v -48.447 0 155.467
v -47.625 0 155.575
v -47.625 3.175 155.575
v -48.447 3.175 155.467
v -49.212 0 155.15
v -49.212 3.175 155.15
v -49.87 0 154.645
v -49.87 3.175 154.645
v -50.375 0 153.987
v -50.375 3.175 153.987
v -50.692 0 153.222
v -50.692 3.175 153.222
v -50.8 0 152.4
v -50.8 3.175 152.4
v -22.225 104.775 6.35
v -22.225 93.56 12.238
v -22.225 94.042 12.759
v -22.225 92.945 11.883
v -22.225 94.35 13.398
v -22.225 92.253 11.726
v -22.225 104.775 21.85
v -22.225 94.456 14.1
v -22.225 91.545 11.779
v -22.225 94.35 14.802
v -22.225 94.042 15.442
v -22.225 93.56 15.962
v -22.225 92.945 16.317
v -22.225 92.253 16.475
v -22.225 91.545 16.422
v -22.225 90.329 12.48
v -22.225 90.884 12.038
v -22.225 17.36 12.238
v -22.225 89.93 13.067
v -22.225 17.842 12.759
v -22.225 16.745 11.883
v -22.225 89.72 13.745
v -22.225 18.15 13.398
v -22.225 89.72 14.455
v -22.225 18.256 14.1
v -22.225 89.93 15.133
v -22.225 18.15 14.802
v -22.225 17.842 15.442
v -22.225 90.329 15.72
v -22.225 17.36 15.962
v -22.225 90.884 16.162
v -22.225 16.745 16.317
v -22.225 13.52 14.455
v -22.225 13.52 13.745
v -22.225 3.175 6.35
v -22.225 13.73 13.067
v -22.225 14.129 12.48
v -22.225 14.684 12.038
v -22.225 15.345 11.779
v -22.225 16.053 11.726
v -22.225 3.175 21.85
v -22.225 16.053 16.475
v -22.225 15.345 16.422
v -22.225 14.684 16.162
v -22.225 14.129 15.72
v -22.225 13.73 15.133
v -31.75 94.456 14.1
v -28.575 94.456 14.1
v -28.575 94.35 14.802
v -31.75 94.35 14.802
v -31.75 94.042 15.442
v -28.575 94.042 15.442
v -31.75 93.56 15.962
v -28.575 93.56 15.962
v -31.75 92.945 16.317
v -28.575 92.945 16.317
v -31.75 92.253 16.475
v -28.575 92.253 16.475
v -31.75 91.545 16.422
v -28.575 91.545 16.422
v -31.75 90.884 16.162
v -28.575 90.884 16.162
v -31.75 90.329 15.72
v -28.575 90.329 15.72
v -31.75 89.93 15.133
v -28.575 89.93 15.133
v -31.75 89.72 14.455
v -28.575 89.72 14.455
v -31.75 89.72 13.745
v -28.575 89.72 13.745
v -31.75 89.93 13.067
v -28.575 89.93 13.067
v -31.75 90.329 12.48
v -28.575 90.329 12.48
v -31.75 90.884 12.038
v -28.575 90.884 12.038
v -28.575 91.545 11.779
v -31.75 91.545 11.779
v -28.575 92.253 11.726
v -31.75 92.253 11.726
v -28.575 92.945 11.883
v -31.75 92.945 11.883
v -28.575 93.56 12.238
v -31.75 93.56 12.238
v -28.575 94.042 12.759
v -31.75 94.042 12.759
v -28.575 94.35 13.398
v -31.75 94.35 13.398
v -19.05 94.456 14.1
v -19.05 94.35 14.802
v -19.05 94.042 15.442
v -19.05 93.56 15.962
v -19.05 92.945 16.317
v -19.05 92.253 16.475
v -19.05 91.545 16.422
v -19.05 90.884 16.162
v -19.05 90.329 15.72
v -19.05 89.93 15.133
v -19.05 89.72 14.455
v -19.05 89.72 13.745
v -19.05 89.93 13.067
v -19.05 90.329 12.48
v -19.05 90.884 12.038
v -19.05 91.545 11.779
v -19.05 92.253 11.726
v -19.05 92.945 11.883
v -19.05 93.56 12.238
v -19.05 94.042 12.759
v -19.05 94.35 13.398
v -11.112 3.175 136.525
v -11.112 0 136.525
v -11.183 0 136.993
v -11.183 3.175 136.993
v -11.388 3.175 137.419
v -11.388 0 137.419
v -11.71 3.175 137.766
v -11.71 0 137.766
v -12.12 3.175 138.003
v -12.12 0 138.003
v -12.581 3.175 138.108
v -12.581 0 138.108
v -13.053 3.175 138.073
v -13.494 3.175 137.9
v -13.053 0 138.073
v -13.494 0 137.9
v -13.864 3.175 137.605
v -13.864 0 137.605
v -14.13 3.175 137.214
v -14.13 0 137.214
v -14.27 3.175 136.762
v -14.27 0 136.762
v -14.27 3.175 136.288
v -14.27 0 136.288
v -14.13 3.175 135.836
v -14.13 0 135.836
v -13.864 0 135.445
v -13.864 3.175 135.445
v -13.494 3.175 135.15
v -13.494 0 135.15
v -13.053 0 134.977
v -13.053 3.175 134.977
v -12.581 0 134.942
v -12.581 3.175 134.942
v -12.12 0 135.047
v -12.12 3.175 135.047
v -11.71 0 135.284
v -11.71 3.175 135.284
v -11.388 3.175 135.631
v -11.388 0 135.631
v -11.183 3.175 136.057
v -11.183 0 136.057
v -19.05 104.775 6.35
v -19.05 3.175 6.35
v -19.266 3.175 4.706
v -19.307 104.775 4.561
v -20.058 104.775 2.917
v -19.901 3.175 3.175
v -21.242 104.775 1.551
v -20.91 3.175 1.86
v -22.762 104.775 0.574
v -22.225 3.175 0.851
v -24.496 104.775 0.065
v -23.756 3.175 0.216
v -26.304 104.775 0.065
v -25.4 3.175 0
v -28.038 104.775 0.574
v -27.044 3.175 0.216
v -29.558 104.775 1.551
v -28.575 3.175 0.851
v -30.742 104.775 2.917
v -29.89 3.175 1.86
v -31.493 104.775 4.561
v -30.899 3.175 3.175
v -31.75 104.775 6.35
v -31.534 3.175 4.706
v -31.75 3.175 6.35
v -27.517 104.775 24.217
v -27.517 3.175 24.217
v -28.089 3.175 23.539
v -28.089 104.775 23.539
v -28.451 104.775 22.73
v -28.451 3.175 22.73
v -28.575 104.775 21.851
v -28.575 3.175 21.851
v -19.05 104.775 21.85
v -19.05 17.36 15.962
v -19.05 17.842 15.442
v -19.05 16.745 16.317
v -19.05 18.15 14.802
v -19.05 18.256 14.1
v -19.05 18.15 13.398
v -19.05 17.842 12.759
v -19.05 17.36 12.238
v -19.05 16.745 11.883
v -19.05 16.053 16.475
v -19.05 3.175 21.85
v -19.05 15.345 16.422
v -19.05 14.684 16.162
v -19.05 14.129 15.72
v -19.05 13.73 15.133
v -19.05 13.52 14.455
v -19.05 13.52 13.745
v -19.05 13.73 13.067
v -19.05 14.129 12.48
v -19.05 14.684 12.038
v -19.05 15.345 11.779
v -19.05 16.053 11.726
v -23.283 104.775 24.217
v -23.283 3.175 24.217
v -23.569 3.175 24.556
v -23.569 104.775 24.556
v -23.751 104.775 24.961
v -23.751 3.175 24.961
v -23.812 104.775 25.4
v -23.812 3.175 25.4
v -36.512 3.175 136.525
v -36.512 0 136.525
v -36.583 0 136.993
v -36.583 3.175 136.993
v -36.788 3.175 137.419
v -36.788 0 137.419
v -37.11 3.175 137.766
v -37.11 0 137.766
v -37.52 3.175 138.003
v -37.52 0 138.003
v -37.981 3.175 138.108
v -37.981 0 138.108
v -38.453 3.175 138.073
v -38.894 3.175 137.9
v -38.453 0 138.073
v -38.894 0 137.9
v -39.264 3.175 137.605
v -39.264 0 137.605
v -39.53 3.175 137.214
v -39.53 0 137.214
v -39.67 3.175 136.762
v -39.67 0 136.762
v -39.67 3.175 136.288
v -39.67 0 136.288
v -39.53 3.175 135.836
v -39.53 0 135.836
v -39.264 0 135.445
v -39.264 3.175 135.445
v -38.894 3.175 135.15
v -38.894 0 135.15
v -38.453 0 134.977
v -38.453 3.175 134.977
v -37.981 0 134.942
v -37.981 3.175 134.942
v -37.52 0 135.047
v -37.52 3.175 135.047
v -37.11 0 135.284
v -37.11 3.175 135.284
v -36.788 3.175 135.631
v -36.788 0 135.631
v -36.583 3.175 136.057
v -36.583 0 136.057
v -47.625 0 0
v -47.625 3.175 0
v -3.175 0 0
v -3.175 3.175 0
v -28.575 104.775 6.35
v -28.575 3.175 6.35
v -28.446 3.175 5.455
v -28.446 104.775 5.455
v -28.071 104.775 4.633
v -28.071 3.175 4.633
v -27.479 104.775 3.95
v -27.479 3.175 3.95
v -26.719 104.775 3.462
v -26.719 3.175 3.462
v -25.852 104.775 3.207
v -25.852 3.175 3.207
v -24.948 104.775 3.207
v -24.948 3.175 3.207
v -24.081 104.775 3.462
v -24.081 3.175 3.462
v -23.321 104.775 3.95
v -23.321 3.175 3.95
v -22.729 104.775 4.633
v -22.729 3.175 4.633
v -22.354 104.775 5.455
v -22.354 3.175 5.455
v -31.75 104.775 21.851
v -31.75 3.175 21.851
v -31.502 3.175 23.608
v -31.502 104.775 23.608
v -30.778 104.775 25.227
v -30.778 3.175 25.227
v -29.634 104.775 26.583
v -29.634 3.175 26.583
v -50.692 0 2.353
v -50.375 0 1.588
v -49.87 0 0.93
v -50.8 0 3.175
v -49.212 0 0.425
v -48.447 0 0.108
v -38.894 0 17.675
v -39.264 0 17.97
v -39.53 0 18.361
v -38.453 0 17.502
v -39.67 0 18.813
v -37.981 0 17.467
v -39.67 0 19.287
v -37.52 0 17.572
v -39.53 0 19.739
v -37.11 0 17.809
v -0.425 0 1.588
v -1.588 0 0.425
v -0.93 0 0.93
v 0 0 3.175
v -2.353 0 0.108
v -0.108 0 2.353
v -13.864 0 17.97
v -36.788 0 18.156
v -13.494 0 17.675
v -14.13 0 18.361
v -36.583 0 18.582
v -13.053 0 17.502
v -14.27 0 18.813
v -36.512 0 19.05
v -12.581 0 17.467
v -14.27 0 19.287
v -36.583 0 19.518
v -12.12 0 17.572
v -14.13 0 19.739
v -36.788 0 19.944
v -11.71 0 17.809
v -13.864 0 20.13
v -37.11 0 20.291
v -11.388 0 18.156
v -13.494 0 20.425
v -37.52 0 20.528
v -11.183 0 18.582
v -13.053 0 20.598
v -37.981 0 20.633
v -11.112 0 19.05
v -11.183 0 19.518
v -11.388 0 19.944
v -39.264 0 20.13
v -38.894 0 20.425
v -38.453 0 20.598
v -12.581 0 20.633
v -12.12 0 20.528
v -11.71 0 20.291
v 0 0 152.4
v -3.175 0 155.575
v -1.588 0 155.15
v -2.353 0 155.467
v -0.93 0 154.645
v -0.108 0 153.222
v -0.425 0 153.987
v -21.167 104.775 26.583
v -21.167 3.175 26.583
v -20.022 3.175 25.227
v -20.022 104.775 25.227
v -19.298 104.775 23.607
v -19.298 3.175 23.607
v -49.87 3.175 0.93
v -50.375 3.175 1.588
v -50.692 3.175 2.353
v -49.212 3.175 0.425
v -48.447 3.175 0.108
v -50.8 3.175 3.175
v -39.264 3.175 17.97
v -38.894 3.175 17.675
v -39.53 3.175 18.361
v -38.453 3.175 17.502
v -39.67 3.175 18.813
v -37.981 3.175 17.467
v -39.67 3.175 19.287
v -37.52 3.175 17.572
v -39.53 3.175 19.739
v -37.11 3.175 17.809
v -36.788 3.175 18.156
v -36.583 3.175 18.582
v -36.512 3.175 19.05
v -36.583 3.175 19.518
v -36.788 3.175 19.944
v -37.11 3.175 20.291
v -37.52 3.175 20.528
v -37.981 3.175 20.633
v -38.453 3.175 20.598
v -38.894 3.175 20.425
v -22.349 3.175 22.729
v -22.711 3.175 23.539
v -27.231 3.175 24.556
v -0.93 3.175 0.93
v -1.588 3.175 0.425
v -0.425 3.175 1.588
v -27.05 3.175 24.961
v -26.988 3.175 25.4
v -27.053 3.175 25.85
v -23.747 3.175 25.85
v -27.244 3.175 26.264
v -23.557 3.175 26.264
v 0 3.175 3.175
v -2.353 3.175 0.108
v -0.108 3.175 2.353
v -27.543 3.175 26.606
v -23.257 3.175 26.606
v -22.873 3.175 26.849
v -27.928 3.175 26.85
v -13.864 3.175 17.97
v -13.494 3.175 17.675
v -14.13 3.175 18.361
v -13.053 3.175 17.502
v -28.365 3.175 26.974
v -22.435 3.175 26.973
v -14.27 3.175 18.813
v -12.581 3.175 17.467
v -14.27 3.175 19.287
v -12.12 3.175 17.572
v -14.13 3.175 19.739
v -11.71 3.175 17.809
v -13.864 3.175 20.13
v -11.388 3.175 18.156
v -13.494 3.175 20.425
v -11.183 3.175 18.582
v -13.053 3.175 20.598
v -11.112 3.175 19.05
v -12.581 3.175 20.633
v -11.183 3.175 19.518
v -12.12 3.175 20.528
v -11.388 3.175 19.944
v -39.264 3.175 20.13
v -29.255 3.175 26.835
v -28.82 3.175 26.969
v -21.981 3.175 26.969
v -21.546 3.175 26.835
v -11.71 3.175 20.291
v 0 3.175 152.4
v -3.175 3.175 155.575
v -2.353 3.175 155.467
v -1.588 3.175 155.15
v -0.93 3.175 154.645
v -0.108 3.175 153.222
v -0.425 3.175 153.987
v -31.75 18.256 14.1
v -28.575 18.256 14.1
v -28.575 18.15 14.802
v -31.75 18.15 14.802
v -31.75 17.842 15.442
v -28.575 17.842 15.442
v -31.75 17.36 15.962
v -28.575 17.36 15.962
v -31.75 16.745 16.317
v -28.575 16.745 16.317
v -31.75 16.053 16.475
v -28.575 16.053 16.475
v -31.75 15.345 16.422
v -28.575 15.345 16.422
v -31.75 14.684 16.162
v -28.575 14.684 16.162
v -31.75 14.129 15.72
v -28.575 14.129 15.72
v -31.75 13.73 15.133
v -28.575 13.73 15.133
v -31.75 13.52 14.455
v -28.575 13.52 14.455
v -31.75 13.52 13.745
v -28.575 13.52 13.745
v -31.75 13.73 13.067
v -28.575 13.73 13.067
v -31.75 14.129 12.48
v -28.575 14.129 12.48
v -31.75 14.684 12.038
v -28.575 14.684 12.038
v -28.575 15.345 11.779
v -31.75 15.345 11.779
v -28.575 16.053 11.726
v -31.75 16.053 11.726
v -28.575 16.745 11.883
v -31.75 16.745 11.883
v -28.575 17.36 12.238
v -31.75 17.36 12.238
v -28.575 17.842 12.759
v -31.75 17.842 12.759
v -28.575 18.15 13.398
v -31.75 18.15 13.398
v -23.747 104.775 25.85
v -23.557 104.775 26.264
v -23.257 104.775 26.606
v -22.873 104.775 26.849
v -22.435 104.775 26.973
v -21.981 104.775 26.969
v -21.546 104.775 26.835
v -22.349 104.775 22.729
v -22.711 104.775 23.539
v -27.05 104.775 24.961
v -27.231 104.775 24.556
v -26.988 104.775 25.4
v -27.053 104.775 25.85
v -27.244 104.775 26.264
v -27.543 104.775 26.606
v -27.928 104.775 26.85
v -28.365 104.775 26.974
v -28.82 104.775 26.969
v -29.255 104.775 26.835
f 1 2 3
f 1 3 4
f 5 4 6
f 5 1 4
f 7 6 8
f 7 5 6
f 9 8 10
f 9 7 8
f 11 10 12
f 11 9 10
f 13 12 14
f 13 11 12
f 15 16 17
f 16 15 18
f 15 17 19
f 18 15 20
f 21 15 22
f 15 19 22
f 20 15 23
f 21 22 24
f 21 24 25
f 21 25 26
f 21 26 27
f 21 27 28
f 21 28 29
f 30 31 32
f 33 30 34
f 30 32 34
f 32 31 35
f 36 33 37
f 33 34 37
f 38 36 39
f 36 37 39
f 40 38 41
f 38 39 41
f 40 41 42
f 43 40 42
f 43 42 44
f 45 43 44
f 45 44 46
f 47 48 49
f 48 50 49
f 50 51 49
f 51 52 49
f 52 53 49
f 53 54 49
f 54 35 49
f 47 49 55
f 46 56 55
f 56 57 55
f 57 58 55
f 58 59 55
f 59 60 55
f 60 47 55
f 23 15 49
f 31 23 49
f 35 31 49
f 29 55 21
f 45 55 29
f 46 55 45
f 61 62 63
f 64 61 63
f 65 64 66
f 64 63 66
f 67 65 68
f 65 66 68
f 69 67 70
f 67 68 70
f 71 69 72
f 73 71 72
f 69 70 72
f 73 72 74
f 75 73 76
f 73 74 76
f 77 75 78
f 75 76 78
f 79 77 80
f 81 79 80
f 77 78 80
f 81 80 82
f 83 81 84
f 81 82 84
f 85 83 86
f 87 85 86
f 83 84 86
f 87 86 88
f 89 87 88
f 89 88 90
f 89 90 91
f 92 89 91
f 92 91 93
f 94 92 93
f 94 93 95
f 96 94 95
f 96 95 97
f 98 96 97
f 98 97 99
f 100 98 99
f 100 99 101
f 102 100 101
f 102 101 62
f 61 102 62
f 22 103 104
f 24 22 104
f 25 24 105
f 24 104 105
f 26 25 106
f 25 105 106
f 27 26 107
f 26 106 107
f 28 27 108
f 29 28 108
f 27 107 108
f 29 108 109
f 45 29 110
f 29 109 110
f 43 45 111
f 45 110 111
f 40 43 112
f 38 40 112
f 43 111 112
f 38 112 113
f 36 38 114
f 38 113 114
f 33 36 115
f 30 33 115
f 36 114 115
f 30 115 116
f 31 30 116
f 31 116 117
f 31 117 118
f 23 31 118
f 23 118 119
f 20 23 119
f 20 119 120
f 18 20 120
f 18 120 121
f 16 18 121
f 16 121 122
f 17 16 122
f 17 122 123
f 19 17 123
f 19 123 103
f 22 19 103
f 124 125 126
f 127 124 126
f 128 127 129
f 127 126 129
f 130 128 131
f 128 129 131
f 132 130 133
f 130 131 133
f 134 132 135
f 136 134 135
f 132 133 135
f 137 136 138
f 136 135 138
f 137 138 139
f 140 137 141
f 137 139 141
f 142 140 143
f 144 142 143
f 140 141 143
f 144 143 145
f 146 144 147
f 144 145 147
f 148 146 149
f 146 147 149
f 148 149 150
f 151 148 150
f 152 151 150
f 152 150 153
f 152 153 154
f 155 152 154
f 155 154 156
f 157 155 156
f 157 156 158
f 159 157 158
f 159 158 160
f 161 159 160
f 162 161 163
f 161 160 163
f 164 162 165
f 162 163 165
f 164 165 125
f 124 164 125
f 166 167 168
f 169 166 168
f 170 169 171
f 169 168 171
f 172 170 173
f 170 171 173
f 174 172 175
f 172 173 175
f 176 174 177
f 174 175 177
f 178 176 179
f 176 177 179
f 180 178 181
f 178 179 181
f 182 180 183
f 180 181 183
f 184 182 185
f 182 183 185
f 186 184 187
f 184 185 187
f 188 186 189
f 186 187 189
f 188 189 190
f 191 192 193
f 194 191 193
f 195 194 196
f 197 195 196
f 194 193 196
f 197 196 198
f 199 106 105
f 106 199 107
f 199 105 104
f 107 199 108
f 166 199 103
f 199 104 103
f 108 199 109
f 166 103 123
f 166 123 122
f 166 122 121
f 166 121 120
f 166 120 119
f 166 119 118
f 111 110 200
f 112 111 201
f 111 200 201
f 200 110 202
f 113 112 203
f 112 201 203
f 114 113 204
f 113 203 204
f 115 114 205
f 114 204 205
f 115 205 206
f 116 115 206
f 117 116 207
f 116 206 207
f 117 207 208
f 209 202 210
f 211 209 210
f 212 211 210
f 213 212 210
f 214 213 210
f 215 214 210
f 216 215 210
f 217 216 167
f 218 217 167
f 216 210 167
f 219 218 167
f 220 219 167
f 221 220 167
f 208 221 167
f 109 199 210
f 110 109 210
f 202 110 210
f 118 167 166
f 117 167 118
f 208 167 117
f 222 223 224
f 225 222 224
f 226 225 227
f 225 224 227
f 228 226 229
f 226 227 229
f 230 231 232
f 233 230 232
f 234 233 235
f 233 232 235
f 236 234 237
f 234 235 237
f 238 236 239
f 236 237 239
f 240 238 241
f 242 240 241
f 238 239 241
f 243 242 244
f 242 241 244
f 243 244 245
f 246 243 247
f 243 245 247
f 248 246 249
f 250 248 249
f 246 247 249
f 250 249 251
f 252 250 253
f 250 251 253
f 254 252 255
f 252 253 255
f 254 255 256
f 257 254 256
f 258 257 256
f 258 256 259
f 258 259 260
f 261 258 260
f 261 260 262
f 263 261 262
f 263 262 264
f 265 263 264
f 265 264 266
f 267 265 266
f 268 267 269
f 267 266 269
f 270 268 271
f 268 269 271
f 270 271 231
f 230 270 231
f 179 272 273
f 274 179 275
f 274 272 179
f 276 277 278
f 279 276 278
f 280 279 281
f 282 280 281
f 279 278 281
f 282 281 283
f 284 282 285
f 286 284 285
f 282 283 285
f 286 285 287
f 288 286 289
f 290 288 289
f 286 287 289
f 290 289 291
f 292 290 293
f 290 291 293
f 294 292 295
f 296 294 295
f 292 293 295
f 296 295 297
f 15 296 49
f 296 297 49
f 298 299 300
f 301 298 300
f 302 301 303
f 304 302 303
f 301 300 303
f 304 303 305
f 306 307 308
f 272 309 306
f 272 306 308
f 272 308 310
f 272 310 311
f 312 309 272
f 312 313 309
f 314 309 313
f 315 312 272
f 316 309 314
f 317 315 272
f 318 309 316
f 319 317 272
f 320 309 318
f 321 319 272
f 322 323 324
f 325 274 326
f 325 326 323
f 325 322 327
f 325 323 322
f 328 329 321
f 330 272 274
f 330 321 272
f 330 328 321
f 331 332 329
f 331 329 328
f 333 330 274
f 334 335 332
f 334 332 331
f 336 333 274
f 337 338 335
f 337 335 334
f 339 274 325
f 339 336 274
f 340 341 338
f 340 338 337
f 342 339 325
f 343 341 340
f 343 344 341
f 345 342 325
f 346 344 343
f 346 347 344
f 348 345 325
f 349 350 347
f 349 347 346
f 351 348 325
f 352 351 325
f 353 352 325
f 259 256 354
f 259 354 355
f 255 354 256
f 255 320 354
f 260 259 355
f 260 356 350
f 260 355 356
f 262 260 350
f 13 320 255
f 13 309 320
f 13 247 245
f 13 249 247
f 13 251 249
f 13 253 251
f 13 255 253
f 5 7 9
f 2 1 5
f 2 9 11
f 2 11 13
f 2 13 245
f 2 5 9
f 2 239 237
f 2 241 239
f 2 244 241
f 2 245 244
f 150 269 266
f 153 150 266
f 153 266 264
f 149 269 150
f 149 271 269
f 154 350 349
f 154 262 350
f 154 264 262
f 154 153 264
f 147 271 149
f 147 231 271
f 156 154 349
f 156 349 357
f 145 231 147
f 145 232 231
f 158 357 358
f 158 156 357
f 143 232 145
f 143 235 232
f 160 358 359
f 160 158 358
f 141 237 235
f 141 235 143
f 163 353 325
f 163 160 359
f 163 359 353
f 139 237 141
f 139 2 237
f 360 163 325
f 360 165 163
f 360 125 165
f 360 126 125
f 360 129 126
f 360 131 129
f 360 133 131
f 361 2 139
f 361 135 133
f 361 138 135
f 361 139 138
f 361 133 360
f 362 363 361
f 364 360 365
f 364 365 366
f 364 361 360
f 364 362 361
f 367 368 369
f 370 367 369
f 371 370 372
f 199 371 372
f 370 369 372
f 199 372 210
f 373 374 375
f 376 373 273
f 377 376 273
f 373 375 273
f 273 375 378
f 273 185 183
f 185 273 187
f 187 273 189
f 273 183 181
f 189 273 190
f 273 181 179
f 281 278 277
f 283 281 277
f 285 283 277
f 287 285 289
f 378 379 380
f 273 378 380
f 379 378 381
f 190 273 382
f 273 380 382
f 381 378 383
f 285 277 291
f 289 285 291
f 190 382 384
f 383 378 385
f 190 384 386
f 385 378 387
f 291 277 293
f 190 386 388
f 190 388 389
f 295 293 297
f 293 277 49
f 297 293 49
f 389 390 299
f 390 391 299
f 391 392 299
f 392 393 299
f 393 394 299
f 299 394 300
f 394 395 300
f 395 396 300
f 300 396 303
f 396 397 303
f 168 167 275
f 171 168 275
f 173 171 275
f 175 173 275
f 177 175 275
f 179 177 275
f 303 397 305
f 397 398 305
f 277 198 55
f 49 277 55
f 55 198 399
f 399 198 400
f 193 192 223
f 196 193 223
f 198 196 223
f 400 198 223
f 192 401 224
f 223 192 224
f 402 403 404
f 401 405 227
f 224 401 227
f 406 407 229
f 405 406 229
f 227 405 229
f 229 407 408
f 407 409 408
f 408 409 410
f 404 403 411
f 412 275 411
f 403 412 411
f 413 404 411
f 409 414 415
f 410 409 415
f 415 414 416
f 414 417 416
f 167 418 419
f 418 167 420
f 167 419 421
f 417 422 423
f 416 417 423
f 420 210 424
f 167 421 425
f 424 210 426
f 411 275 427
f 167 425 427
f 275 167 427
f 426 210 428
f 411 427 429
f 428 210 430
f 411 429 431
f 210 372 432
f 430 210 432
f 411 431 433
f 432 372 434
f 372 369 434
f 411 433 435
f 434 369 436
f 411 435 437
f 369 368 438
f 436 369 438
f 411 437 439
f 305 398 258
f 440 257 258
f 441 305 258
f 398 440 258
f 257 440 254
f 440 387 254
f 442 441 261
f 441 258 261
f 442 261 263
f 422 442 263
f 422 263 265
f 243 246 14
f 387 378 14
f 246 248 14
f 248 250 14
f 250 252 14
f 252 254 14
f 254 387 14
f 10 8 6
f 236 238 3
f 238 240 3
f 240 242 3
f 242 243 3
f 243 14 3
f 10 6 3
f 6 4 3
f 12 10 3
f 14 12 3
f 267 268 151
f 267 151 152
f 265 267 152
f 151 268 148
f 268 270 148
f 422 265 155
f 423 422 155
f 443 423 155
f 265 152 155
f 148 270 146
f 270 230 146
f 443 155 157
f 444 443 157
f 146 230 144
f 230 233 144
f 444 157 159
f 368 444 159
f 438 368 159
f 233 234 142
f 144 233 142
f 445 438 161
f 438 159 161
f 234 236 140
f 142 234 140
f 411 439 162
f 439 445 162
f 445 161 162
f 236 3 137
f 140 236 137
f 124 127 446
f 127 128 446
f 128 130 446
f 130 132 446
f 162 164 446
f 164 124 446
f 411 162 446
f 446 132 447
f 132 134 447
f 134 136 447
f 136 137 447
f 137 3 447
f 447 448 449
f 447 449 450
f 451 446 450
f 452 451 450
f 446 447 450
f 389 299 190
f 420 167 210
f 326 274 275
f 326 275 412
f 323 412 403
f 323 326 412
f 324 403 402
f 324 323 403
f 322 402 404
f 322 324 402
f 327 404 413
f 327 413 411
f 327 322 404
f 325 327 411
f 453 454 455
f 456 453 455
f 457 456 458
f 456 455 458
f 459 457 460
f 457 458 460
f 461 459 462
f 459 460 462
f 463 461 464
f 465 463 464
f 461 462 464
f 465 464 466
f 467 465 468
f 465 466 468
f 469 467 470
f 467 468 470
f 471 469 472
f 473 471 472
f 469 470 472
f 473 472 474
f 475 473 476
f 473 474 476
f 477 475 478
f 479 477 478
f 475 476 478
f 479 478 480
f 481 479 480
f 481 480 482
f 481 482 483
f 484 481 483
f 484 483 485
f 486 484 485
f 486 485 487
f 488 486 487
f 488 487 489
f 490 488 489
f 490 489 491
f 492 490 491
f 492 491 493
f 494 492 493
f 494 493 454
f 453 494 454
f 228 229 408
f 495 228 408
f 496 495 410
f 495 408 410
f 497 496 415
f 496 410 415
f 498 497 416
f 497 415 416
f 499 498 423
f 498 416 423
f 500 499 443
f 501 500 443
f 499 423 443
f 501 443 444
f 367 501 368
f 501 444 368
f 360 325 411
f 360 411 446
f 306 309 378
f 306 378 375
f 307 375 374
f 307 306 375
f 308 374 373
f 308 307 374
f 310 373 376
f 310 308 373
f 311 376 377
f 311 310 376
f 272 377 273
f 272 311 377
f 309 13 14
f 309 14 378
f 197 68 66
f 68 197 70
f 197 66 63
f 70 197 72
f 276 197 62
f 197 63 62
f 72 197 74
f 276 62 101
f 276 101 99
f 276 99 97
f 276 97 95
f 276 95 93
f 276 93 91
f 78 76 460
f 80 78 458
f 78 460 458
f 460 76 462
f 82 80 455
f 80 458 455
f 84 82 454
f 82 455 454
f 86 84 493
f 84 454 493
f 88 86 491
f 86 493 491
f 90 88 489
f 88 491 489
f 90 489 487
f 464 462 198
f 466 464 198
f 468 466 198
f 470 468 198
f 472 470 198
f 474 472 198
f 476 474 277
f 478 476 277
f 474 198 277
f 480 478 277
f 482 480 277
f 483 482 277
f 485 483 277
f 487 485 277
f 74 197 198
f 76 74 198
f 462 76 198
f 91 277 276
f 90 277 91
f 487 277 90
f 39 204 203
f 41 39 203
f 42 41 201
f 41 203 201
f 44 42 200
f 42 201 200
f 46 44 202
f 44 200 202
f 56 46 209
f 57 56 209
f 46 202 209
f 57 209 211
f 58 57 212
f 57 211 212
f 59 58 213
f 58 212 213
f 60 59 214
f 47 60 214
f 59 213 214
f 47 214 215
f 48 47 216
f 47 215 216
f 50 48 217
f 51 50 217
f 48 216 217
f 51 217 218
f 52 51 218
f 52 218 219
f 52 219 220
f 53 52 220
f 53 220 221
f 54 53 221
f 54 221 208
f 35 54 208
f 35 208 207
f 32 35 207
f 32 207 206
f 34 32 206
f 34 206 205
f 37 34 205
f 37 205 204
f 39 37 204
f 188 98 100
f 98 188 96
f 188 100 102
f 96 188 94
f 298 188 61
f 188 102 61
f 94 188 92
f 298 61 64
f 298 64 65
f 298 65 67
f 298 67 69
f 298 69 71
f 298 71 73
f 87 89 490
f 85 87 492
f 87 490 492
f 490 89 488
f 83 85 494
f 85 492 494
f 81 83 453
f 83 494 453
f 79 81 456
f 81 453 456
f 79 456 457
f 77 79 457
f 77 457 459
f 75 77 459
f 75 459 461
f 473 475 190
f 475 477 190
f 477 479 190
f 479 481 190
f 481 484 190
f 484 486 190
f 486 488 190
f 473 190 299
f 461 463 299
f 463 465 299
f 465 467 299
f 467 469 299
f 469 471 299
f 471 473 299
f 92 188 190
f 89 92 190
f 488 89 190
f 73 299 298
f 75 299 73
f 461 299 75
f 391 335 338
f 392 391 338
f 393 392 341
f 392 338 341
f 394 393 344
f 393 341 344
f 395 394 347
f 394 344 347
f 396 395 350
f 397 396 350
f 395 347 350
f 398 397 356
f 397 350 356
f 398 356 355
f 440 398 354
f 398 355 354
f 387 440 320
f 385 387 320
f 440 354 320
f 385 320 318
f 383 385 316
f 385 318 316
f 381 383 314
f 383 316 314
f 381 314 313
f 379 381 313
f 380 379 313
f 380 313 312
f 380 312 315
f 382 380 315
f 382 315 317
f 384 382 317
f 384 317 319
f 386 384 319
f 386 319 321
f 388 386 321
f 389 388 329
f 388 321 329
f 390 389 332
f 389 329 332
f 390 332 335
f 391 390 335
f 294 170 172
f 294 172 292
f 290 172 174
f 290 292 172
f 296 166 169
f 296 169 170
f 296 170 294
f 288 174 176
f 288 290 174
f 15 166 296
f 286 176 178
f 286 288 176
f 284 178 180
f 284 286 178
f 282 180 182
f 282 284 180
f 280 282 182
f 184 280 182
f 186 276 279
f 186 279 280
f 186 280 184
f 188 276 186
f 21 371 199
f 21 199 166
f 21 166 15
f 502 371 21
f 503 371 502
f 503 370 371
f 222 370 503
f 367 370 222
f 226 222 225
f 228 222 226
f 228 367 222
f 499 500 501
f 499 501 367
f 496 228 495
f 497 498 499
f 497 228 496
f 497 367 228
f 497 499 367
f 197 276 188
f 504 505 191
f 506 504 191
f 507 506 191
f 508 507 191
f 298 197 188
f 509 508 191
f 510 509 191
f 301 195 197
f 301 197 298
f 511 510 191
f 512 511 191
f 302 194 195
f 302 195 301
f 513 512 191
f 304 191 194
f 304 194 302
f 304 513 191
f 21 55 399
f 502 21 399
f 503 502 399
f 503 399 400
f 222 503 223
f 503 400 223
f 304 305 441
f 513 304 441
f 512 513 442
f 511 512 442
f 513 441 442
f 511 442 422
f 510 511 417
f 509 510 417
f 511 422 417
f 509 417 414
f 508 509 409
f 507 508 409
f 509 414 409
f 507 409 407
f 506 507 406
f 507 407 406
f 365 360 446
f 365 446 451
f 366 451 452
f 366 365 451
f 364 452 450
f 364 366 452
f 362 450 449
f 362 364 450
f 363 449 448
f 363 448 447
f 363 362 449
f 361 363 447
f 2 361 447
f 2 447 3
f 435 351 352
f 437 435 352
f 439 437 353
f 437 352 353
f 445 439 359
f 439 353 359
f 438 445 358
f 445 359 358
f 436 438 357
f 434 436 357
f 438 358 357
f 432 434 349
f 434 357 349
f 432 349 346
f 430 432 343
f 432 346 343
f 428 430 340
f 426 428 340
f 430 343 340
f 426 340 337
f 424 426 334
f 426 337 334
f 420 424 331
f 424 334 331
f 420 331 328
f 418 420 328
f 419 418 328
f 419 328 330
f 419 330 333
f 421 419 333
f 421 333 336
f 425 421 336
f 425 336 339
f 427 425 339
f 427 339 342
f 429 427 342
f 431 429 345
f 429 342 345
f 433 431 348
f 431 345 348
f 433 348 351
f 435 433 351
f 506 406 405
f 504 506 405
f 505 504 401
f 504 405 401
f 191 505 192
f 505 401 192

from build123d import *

# Parameters (mm, degrees)
F0_R     = 1.5875
F1_DEPTH = 3.175
F3_DEPTH = 101.6
F4_R     = 2.38125
F5_DEPTH = 31.751


with BuildPart() as f1:
    # F0 (on Front) → F1 (new body)
    with BuildSketch(Plane.XZ):
        with BuildLine():
            Line((-47.625, 0), (-3.175, 0))
            ThreePointArc((-3.175, 0), (-0.929936, 0.929936), (0, 3.175))
            Line((0, 3.175), (0, 152.4))
            ThreePointArc((0, 152.4), (-0.929936, 154.645064), (-3.175, 155.575))
            Line((-3.175, 155.575), (-47.625, 155.575))
            ThreePointArc((-47.625, 155.575), (-49.870064, 154.645064), (-50.8, 152.4))
            Line((-50.8, 152.4), (-50.8, 3.175))
            ThreePointArc((-50.8, 3.175), (-49.870064, 0.929936), (-47.625, 0))
        make_face()
        with Locations((-38.1, 19.05)):
            Circle(F0_R, mode=Mode.SUBTRACT)
        with Locations((-12.7, 19.05)):
            Circle(F0_R, mode=Mode.SUBTRACT)
        with Locations((-38.1, 136.525)):
            Circle(F0_R, mode=Mode.SUBTRACT)
        with Locations((-12.7, 136.525)):
            Circle(F0_R, mode=Mode.SUBTRACT)
    extrude(amount=-F1_DEPTH)

    # F2 (on face) → F3 (join)
    with BuildSketch(Plane(origin=(0, 3.175, 0), x_dir=(-1, 0, 0), z_dir=(0, 1, 0))):
        with BuildLine():
            ThreePointArc((27.517005, 24.217467), (28.298458, 23.147245), (28.575, 21.851264))
            Line((28.575, 21.851264), (28.575, 6.35))
            ThreePointArc((28.575, 6.35), (25.4, 3.175), (22.225, 6.35))
            Line((22.225, 6.35), (22.225, 21.850242))
            ThreePointArc((22.225, 21.850242), (22.501635, 23.14643), (23.283333, 24.216747))
            ThreePointArc((23.283333, 24.216747), (23.674183, 24.751906), (23.8125, 25.4))
            ThreePointArc((23.8125, 25.4), (22.873094, 26.849183), (21.166667, 26.583253))
            ThreePointArc((21.166667, 26.583253), (19.60327, 24.442619), (19.05, 21.850242))
            Line((19.05, 21.850242), (19.05, 6.35))
            ThreePointArc((19.05, 6.35), (25.4, 0), (31.75, 6.35))
            Line((31.75, 6.35), (31.75, 21.851264))
            ThreePointArc((31.75, 21.851264), (31.197009, 24.443019), (29.634349, 26.583366))
            ThreePointArc((29.634349, 26.583366), (27.927668, 26.849523), (26.988262, 25.4))
            ThreePointArc((26.988262, 25.4), (27.126467, 24.752321), (27.517005, 24.217467))
        make_face()
    extrude(amount=F3_DEPTH)

    # F4 (on face) → F5 (cut, through all)
    with BuildSketch(Plane.YZ.offset(-19.05)):
        with Locations((15.875, 14.100121)):
            Circle(F4_R)
        with Locations((92.075, 14.100121)):
            Circle(F4_R)
    extrude(amount=-F5_DEPTH, mode=Mode.SUBTRACT)


solid = f1.part
